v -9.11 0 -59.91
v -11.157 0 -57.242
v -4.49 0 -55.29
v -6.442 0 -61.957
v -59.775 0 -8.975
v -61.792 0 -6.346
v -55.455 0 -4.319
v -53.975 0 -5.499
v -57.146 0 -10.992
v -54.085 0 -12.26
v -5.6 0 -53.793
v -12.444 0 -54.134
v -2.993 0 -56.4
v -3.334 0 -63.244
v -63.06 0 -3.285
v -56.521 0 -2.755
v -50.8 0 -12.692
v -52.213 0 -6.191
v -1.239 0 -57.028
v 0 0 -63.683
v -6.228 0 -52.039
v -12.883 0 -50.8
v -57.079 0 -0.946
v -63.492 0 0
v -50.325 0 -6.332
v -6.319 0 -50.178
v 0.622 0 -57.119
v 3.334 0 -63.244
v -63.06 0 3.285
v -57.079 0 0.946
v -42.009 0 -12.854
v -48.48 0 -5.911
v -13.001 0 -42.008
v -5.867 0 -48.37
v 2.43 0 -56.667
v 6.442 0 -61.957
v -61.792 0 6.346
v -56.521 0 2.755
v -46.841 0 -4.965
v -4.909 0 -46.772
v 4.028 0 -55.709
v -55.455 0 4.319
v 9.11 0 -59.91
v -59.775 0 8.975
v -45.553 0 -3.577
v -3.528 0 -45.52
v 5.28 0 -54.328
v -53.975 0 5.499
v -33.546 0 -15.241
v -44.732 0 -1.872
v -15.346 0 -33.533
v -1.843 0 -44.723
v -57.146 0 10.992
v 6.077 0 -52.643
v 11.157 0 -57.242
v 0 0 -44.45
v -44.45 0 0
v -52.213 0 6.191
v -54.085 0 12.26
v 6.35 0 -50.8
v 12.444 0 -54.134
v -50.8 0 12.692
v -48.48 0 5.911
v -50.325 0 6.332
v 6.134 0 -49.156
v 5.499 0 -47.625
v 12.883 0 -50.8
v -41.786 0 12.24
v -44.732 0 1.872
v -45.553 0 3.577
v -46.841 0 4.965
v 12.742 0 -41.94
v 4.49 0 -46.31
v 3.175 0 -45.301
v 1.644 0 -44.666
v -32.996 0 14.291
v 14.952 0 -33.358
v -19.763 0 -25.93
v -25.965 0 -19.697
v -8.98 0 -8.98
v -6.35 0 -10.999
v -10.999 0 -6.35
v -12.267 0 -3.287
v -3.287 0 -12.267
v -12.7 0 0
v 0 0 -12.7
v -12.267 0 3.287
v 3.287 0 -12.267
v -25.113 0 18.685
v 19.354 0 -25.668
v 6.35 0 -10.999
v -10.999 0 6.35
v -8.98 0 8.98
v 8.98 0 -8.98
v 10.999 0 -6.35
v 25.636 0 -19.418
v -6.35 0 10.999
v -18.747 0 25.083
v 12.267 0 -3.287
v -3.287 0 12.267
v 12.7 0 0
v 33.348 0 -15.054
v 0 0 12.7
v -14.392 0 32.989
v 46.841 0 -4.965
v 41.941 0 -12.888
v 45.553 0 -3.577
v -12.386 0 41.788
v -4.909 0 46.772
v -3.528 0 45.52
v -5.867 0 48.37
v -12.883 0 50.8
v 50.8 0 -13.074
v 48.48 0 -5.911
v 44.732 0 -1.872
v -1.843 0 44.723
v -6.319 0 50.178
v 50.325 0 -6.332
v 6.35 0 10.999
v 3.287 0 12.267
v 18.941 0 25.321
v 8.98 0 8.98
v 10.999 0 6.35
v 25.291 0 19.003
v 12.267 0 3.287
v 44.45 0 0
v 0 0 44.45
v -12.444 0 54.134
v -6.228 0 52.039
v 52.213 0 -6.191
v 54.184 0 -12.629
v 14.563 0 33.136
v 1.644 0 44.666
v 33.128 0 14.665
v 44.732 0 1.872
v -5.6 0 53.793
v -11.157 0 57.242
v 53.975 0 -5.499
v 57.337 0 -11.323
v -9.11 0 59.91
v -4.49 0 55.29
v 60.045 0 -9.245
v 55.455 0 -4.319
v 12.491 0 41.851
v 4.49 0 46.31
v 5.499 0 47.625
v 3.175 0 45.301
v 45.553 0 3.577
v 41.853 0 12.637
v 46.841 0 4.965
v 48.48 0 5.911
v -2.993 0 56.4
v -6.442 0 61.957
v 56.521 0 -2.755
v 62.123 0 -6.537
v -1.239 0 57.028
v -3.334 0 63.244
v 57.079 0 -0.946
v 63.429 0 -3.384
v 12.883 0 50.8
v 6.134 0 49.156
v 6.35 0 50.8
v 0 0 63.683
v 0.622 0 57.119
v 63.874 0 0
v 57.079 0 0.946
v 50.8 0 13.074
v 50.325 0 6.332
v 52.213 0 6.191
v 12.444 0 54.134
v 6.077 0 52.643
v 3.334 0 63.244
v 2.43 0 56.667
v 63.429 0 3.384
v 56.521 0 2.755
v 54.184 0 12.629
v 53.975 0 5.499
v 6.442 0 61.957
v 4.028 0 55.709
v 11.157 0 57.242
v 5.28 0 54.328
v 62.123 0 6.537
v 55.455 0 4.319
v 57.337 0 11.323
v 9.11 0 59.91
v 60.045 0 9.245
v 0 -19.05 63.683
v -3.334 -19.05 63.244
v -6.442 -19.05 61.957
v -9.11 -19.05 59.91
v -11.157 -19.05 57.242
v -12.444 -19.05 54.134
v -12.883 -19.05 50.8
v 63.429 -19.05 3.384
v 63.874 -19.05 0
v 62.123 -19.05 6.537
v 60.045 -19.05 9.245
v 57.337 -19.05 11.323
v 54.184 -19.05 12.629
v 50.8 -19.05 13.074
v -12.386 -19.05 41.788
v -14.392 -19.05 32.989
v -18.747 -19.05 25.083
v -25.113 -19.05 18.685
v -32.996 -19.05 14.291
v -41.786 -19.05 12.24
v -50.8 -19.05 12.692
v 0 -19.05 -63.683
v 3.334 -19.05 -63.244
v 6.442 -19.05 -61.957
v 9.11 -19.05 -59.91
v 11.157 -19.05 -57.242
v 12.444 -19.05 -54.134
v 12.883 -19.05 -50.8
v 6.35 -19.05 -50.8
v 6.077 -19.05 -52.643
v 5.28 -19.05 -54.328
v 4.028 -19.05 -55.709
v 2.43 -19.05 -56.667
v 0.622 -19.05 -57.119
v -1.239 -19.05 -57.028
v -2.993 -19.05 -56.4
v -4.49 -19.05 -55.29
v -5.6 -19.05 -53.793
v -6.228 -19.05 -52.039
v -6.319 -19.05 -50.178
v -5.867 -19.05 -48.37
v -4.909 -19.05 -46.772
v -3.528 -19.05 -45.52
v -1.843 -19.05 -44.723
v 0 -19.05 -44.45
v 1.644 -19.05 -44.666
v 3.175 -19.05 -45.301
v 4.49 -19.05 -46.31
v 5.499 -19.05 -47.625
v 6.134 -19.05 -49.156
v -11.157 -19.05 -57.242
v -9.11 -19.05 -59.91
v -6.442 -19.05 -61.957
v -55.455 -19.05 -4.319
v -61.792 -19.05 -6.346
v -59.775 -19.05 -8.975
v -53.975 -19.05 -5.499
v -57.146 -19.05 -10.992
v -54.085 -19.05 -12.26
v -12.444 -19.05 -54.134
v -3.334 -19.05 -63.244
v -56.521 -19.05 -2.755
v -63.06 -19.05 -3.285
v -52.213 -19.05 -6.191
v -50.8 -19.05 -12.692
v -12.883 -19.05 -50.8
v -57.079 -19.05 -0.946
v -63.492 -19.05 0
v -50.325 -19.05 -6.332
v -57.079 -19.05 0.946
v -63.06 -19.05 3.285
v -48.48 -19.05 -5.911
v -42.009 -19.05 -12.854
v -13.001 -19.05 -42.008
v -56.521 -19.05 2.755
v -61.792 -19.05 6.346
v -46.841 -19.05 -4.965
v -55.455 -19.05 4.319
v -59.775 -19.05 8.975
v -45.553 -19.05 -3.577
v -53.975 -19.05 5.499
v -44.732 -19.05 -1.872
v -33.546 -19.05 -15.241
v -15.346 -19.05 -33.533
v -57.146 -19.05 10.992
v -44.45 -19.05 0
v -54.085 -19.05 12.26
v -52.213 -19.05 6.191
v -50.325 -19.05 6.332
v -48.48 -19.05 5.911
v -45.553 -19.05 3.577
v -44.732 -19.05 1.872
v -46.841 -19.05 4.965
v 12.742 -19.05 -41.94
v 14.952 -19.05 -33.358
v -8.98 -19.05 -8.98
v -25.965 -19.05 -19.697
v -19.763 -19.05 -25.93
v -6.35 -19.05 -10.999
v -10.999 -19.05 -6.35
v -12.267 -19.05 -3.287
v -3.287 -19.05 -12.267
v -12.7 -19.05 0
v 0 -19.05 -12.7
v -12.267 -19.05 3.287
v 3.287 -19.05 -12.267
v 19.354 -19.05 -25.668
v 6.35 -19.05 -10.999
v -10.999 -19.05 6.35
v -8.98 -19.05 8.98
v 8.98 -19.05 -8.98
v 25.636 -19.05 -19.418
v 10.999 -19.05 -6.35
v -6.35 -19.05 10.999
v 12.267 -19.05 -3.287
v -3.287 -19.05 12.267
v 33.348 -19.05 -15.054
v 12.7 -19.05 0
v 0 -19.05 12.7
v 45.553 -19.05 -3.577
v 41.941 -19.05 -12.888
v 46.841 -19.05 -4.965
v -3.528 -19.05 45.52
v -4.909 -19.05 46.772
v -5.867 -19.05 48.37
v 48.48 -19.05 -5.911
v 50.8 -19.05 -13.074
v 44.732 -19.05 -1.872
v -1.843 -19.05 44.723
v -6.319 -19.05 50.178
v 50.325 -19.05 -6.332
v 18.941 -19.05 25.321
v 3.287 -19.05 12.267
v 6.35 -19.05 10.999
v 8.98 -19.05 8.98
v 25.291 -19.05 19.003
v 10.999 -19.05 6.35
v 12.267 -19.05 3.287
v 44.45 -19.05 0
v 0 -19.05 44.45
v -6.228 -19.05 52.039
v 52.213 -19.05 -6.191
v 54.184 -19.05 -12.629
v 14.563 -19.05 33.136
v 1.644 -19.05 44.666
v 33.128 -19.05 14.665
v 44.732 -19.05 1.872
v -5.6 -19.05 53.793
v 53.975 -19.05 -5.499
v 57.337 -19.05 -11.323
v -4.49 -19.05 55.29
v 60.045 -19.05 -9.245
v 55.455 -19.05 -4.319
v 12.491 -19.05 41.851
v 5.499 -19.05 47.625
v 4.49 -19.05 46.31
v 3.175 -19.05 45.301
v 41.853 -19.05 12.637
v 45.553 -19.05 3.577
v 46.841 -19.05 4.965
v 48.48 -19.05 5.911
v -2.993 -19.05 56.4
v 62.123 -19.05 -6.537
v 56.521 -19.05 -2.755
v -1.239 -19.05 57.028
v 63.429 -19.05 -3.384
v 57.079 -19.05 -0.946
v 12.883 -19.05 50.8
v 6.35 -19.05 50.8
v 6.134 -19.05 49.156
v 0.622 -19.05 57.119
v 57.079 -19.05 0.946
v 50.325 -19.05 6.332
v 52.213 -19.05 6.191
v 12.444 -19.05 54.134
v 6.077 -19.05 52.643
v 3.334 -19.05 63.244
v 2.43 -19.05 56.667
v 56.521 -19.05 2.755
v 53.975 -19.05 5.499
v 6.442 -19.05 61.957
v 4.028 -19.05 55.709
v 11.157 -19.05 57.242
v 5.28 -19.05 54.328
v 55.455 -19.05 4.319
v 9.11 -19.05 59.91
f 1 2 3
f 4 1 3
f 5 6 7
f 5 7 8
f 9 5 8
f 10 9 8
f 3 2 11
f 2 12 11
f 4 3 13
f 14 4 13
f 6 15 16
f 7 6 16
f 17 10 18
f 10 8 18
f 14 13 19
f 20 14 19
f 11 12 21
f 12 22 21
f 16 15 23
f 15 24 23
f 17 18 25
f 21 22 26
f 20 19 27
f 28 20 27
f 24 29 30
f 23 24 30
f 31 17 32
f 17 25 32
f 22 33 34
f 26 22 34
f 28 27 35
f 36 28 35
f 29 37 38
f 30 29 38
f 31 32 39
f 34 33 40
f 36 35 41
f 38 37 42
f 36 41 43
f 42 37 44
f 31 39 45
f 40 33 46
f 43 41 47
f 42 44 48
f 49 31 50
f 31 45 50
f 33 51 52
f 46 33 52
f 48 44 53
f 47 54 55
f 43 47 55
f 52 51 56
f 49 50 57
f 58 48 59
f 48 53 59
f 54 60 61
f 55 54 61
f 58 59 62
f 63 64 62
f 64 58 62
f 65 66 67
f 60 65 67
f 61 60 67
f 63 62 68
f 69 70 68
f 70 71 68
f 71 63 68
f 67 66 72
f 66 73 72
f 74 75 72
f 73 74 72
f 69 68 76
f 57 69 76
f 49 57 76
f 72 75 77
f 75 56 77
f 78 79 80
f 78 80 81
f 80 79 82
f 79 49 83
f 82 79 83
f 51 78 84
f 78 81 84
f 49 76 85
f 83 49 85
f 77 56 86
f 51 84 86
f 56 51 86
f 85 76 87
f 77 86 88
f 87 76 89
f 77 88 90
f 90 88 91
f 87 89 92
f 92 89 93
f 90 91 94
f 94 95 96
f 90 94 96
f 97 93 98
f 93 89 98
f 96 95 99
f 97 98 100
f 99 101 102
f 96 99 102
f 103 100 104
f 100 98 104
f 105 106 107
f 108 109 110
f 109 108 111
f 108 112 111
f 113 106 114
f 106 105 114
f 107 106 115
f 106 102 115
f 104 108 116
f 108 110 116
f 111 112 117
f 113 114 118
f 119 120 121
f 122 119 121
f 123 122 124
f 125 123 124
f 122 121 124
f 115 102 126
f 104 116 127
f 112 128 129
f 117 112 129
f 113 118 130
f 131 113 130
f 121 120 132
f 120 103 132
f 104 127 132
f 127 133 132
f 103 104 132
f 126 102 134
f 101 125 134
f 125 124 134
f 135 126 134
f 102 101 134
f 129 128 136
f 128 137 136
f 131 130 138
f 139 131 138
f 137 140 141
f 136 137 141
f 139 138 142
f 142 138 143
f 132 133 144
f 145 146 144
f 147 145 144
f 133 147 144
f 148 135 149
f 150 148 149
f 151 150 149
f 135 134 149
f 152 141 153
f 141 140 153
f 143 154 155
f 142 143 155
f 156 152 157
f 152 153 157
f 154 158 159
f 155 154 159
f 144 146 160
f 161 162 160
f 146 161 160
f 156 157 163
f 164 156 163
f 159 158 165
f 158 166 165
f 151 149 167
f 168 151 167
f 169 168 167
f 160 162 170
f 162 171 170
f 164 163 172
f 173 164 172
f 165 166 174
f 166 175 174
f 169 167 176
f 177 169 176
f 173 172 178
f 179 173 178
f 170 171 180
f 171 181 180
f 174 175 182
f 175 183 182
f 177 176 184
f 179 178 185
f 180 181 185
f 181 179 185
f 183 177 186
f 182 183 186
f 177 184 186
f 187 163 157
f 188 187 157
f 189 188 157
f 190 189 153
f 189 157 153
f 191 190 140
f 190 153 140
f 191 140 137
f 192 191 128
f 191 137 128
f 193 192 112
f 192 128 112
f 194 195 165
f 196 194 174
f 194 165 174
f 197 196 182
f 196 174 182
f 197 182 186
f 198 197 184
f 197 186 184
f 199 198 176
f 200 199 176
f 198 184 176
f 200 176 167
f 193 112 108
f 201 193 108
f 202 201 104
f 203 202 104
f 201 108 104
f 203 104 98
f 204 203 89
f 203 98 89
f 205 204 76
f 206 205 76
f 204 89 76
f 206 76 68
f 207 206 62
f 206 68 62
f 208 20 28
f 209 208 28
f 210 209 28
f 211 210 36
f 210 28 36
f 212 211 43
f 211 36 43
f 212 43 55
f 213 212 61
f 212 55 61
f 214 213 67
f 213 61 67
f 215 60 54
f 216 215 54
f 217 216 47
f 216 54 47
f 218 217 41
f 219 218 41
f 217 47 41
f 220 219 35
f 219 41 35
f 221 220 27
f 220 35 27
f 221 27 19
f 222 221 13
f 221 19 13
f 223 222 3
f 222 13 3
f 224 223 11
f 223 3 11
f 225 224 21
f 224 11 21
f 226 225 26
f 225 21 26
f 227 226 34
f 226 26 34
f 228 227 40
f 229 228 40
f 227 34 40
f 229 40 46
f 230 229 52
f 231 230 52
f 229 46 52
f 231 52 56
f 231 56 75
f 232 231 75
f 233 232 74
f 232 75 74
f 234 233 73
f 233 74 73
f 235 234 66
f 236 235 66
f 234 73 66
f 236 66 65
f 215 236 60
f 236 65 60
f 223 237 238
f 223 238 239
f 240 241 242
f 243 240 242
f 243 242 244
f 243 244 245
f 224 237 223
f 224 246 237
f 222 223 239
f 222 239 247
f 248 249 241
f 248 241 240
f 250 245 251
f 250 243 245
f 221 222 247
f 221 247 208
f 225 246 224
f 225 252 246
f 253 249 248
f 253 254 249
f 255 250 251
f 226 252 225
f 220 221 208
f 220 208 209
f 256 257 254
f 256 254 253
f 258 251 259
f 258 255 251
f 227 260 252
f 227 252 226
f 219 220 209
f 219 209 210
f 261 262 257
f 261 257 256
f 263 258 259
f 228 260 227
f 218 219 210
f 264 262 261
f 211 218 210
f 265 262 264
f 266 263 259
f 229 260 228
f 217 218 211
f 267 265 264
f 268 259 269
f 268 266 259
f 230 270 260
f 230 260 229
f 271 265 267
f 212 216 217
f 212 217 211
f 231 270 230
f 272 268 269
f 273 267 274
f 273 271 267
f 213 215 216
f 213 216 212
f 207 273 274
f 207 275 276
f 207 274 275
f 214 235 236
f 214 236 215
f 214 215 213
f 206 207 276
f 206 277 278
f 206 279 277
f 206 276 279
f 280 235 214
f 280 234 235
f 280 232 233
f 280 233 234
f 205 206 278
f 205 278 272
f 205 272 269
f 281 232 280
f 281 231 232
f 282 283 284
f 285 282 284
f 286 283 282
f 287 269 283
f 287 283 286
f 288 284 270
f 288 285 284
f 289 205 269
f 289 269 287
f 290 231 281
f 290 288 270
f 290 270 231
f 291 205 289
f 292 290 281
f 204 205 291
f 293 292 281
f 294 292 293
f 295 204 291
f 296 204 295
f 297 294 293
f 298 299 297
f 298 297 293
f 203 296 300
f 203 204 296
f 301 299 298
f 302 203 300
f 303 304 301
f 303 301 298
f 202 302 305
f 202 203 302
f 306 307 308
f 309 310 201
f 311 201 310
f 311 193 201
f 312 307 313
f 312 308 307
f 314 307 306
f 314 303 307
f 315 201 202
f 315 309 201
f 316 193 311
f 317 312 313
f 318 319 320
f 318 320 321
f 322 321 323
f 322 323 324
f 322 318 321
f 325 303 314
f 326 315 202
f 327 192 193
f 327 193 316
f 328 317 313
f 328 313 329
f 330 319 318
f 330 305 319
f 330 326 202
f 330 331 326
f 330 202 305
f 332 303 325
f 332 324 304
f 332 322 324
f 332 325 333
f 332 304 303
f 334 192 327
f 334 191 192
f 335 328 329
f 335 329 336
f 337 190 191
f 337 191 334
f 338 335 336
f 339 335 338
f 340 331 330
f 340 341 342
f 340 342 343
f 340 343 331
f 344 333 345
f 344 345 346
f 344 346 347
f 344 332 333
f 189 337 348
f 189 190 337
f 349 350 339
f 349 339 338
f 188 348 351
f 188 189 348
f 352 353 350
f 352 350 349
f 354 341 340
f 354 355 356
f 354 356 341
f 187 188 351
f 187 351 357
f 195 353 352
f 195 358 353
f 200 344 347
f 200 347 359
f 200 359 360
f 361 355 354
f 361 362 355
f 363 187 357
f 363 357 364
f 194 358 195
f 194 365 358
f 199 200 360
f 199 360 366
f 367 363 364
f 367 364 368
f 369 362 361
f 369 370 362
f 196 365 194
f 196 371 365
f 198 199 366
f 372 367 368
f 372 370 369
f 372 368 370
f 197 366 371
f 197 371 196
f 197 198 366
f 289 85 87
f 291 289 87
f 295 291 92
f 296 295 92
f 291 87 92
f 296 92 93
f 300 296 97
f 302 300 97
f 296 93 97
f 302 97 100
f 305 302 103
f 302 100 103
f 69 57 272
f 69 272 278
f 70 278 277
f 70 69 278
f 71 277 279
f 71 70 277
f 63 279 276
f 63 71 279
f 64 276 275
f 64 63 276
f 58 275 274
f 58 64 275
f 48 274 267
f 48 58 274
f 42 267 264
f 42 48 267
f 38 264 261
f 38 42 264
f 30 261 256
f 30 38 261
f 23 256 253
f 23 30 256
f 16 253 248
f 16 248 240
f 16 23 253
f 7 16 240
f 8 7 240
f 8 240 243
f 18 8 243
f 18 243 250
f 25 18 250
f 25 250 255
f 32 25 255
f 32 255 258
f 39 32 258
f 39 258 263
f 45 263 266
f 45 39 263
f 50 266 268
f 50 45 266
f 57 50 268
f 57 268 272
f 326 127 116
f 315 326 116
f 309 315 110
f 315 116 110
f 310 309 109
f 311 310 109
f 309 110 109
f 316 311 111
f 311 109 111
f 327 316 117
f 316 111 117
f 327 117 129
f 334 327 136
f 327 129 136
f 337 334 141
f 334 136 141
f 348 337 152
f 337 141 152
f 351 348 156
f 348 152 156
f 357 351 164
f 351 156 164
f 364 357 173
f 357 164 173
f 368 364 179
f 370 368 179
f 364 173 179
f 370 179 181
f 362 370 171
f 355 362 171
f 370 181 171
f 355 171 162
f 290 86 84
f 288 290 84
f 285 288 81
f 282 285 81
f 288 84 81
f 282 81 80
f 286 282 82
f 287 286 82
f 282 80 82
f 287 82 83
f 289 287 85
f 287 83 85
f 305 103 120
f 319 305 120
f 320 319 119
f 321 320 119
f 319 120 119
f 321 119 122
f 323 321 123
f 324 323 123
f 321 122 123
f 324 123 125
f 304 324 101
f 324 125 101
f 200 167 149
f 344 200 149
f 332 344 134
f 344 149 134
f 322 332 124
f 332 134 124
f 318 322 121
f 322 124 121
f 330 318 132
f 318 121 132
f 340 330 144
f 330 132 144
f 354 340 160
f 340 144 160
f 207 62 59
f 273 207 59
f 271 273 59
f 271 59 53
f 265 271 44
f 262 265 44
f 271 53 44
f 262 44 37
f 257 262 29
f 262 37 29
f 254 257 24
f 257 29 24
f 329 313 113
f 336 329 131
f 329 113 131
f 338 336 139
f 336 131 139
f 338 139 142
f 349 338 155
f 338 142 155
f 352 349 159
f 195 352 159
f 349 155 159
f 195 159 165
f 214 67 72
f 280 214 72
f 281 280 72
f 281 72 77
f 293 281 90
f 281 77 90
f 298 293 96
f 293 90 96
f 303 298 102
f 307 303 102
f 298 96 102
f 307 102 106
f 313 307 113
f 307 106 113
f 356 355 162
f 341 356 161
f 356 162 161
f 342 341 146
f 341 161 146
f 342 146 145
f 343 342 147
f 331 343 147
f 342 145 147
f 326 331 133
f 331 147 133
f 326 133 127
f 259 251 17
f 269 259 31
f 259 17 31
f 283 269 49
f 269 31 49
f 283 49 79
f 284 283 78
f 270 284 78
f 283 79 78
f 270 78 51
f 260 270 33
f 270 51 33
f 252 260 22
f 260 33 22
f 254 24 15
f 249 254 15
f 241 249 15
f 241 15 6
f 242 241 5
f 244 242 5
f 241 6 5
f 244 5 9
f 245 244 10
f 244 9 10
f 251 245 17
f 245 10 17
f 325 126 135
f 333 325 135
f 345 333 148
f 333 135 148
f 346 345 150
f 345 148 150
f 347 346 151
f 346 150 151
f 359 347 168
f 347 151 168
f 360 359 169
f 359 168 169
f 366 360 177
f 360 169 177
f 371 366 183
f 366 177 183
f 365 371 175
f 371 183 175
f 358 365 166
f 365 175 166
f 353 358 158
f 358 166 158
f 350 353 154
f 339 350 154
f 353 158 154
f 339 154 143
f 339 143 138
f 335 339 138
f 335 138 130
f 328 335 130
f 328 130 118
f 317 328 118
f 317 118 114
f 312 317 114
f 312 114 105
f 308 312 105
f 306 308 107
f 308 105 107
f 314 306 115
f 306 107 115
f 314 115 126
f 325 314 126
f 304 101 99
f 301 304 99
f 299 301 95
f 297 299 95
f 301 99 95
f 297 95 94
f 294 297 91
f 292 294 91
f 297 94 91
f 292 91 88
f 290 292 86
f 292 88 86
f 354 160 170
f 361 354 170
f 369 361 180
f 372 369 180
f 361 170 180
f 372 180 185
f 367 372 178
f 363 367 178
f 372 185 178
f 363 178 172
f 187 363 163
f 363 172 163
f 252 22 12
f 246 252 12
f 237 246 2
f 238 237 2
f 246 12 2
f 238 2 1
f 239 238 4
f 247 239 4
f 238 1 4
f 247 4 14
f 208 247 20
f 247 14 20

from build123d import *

# Parameters (mm, degrees)
F0_R     = 6.35
F1_DEPTH = 19.05


with BuildPart() as f1:
    # F0 (on Front) → F1 (new body)
    with BuildSketch(Plane.XZ):
        with BuildLine():
            ThreePointArc((6.35, -50.8), (4.490128, -46.309872), (0, -44.45))
            ThreePointArc((0, -44.45), (-4.490128, -55.290128), (6.35, -50.8))
        make_face()
        with Locations((-50.8, 0)):
            Circle(F0_R)
        with BuildLine():
            ThreePointArc((6.35, 50.8), (-4.490128, 55.290128), (0, 44.45))
            ThreePointArc((0, 44.45), (4.490128, 46.309872), (6.35, 50.8))
        make_face()
        with BuildLine():
            ThreePointArc((57.15, 0), (50.8, 6.35), (44.45, 0))
            ThreePointArc((44.45, 0), (50.8, -6.35), (57.15, 0))
        make_face()
        with BuildLine():
            ThreePointArc((12.883376, 50.8), (9.109922, 59.909922), (0, 63.683376))
            ThreePointArc((0, 63.683376), (-9.109922, 59.909922), (-12.883376, 50.8))
            ThreePointArc((-12.883376, 50.8), (-21.70632, 21.661631), (-50.8, 12.692425))
            ThreePointArc((-50.8, 12.692425), (-59.7749, 8.9749), (-63.492425, 0))
            ThreePointArc((-63.492425, 0), (-59.7749, -8.9749), (-50.8, -12.692425))
            ThreePointArc((-50.8, -12.692425), (-22.664281, -22.614792), (-12.883376, -50.8))
            ThreePointArc((-12.883376, -50.8), (-9.109922, -59.909922), (0, -63.683376))
            ThreePointArc((0, -63.683376), (9.109922, -59.909922), (12.883376, -50.8))
            ThreePointArc((12.883376, -50.8), (22.285467, -22.332575), (50.8, -13.074334))
            ThreePointArc((50.8, -13.074334), (60.04495, -9.24495), (63.874334, 0))
            ThreePointArc((63.874334, 0), (60.04495, 9.24495), (50.8, 13.074334))
            ThreePointArc((50.8, 13.074334), (21.896637, 21.941776), (12.883376, 50.8))
        make_face()
        with BuildLine():
            ThreePointArc((6.35, -50.8), (-4.490128, -55.290128), (0, -44.45))
            ThreePointArc((0, -44.45), (4.490128, -46.309872), (6.35, -50.8))
        make_face(mode=Mode.SUBTRACT)
        with Locations((-50.8, 0)):
            Circle(F0_R, mode=Mode.SUBTRACT)
        with BuildLine():
            ThreePointArc((0, 12.7), (8.980256, 8.980256), (12.7, 0))
            ThreePointArc((12.7, 0), (8.980256, -8.980256), (0, -12.7))
            ThreePointArc((0, -12.7), (-8.980256, -8.980256), (-12.7, 0))
            ThreePointArc((-12.7, 0), (-8.980256, 8.980256), (0, 12.7))
        make_face(mode=Mode.SUBTRACT)
        with BuildLine():
            ThreePointArc((6.35, 50.8), (4.490128, 46.309872), (0, 44.45))
            ThreePointArc((0, 44.45), (-4.490128, 55.290128), (6.35, 50.8))
        make_face(mode=Mode.SUBTRACT)
        with BuildLine():
            ThreePointArc((57.15, 0), (50.8, -6.35), (44.45, 0))
            ThreePointArc((44.45, 0), (50.8, 6.35), (57.15, 0))
        make_face(mode=Mode.SUBTRACT)
    extrude(amount=F1_DEPTH)


solid = f1.part
